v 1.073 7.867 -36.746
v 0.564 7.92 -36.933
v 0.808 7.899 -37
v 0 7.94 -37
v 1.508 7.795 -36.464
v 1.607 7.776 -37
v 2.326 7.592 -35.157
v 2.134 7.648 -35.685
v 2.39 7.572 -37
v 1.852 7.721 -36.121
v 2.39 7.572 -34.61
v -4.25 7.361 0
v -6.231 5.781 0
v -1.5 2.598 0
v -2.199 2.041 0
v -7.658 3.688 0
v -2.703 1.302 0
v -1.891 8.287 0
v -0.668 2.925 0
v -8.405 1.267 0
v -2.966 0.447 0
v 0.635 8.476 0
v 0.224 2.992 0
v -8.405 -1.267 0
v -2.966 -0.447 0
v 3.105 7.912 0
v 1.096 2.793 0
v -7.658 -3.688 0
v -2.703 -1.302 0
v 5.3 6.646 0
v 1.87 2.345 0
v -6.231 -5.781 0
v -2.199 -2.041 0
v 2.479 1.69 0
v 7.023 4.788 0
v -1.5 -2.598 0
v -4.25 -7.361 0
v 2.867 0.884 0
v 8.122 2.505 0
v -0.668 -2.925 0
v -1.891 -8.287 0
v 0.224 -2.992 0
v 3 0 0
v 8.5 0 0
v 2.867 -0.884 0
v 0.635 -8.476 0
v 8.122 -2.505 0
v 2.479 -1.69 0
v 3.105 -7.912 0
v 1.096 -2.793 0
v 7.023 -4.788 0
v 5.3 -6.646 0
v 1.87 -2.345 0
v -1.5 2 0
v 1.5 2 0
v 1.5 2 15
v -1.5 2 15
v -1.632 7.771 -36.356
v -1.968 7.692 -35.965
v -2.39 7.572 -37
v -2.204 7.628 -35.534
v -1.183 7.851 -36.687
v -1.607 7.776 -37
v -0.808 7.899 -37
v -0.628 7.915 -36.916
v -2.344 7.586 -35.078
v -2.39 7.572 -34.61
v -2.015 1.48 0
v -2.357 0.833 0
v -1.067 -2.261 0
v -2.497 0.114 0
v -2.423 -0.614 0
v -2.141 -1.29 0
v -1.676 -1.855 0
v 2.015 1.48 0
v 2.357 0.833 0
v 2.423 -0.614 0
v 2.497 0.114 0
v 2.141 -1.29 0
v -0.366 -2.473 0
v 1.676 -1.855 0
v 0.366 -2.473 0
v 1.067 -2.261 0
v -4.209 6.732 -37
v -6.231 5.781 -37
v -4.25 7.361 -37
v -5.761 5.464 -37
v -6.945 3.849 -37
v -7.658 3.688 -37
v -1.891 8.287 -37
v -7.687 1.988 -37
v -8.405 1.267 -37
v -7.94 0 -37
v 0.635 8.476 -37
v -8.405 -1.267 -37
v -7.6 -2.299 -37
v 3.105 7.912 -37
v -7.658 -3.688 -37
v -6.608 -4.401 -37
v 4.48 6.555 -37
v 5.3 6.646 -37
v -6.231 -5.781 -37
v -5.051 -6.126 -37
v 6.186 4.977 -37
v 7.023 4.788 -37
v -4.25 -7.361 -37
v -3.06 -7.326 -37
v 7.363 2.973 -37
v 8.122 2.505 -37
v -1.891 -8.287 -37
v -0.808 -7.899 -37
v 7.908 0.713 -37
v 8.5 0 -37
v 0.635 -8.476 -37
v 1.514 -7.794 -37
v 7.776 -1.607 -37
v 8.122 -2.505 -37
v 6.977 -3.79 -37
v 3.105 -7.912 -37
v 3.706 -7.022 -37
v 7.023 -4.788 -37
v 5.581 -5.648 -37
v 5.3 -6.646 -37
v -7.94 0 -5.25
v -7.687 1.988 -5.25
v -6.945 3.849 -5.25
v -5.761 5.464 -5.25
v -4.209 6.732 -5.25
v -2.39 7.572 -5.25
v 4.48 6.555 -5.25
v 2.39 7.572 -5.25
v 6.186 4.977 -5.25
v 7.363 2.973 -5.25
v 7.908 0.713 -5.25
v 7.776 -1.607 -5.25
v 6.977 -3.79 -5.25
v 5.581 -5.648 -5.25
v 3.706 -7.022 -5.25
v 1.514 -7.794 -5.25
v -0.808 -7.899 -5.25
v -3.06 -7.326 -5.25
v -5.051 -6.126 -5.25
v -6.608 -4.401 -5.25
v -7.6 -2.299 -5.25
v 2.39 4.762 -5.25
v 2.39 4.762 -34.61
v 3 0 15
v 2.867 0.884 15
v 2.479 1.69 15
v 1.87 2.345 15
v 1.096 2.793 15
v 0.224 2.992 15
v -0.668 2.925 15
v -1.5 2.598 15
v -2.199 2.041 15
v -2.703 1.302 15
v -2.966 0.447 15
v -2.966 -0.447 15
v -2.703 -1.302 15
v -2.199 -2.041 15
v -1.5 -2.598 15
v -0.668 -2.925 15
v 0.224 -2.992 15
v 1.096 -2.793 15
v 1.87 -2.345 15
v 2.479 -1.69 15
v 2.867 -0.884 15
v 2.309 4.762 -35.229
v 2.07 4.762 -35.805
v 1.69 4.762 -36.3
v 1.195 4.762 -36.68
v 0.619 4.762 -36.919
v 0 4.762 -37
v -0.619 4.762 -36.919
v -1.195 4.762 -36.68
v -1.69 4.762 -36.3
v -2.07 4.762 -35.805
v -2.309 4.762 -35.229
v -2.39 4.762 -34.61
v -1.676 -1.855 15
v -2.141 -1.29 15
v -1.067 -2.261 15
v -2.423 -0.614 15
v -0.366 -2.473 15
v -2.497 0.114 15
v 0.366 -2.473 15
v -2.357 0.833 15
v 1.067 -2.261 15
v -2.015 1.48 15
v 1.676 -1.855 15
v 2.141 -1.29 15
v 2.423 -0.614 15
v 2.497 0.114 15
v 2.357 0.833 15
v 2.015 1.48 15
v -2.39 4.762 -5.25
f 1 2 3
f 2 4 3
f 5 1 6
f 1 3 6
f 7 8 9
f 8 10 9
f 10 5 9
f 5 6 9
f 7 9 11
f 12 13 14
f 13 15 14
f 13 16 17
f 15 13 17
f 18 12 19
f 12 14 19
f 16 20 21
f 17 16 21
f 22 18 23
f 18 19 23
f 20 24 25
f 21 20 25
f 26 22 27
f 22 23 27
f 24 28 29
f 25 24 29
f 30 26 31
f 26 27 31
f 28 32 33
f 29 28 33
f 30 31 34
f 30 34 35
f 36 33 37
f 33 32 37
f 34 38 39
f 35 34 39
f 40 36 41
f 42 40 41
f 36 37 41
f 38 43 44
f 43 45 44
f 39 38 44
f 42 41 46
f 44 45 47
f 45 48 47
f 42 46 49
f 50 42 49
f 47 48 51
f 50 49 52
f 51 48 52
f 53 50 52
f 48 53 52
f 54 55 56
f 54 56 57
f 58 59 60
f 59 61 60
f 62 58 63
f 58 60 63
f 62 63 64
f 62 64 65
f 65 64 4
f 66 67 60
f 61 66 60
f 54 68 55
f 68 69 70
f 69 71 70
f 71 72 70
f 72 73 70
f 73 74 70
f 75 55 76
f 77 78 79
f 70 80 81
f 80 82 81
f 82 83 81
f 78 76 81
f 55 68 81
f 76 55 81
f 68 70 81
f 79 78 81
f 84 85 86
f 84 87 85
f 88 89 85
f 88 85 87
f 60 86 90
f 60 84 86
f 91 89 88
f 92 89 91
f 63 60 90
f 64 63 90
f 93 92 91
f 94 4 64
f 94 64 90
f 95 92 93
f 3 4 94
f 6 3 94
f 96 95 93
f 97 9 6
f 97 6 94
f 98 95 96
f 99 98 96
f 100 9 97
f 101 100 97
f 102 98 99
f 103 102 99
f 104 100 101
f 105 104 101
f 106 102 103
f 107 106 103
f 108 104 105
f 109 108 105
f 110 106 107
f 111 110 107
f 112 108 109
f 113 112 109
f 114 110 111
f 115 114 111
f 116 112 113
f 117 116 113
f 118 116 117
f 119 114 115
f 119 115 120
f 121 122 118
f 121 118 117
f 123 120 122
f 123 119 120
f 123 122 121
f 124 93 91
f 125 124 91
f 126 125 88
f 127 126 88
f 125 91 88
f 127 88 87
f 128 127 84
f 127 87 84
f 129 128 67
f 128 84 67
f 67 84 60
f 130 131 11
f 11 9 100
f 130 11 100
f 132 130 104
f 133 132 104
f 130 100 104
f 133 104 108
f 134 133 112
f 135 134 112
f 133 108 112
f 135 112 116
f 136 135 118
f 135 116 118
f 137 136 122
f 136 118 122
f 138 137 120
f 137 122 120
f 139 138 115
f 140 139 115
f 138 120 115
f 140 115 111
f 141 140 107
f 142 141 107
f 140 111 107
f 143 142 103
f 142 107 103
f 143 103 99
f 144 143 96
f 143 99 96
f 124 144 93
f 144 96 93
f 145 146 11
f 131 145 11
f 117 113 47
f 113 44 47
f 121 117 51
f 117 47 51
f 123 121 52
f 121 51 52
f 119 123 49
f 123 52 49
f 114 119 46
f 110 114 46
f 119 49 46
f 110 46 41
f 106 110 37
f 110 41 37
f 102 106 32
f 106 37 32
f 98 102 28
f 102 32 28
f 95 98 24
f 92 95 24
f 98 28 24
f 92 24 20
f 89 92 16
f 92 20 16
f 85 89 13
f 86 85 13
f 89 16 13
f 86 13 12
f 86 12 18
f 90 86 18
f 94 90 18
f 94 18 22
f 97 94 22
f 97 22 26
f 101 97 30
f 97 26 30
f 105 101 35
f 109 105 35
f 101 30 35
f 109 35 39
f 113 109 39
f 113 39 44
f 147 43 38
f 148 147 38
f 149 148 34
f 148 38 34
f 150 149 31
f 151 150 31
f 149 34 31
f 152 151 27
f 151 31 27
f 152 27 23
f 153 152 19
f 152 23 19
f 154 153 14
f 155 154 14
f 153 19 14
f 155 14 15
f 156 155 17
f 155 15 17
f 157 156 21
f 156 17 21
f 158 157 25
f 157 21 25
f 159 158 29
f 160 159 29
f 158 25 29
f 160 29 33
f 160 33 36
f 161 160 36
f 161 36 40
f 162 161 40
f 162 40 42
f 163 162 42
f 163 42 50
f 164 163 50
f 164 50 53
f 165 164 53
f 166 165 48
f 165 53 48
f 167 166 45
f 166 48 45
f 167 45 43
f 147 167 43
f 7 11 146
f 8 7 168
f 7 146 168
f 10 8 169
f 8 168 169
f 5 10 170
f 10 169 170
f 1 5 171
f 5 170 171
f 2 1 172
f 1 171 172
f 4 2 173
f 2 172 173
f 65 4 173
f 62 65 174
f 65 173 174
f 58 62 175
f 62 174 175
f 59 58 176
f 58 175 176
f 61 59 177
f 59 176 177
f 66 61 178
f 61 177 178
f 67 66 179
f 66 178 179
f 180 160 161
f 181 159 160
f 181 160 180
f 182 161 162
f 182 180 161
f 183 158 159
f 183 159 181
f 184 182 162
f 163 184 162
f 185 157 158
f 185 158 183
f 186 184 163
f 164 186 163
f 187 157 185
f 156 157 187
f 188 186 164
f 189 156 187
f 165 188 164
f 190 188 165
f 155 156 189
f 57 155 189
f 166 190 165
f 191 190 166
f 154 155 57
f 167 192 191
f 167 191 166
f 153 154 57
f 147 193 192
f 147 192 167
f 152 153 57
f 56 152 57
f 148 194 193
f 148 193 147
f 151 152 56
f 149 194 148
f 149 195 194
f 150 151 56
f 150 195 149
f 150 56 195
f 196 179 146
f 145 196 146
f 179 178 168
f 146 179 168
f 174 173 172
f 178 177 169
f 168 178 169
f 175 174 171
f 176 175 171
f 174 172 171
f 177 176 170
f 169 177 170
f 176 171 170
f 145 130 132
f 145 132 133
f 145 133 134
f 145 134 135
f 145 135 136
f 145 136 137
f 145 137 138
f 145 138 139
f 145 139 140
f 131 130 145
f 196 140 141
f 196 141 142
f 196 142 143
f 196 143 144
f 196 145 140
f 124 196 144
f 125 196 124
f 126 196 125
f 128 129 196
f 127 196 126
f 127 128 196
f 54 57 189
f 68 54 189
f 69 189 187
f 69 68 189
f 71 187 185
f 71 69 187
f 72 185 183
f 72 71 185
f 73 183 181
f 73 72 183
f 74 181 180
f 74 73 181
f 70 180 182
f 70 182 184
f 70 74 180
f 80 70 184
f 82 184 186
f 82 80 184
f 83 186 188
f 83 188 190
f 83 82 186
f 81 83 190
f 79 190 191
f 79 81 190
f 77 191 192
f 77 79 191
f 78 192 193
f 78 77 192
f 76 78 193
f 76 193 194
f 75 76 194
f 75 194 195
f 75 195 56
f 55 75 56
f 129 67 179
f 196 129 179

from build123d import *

# Parameters (mm, degrees)
SKETCH1_R               = 3
BOSS_EXTRUDE1_DEPTH     = 15
SKETCH2_R               = 8.5
BOSS_EXTRUDE2_DEPTH     = 5.25
SKETCH3_R               = 8.5
BOSS_EXTRUDE4_DEPTH     = 31.75
CUT_EXTRUDE4_DEPTH      = 31.75
CUT_EXTRUDE5_REACH      = 42.213
CUT_EXTRUDE5_END_RADIUS = 7.94


with BuildPart() as part:
    # Sketch1 → Boss-Extrude1 (new body)
    with BuildSketch(Plane.XY):
        Circle(SKETCH1_R)
        with BuildLine():
            Line((1.5, 2), (-1.5, 2))
            ThreePointArc((-1.5, 2), (0, -2.5), (1.5, 2))
        make_face(mode=Mode.SUBTRACT)
    extrude(amount=BOSS_EXTRUDE1_DEPTH)

    # Sketch2 → Boss-Extrude2 (add)
    with BuildSketch(Plane(origin=(0, 0, 0), x_dir=(-1, 0, 0), z_dir=(0, 0, -1))):
        with Locations(Location((0, 0, 0), (0, 0, 180))):
            Circle(SKETCH2_R)
    extrude(amount=BOSS_EXTRUDE2_DEPTH)

    # Sketch3 → Boss-Extrude4 (add)
    with BuildSketch(Plane(origin=(0, 0, -5.25), x_dir=(-1, 0, 0), z_dir=(0, 0, -1))):
        with Locations(Location((0, 0, 0), (0, 0, 180))):
            Circle(SKETCH3_R)
    extrude(amount=BOSS_EXTRUDE4_DEPTH)

    # Sketch13 → Cut-Extrude4 (cut)
    with BuildSketch(Plane(origin=(0, 0, -37), x_dir=(-1, 0, 0), z_dir=(0, 0, -1))):
        with BuildLine():
            Line((-2.39, 4.761756731), (-2.39, 7.571756731))
            ThreePointArc((-2.39, 7.571756731), (-4.693985513, -6.403912866), (7.94, 0))
            ThreePointArc((7.94, 0), (6.403912866, 4.693985513), (2.39, 7.571756731))
            Line((2.39, 7.571756731), (2.39, 4.761756731))
            Line((2.39, 4.761756731), (-2.39, 4.761756731))
        make_face()
    extrude(amount=-CUT_EXTRUDE4_DEPTH, mode=Mode.SUBTRACT)

    # Cut-Extrude5: up to this cylinder (the profile starts inside it)
    cut_extrude5_end = Plane(origin=(0, 0, -36.466151), z_dir=(0, 0, -1)) * Cylinder(CUT_EXTRUDE5_END_RADIUS, 101.306, mode=Mode.PRIVATE)
    # Sketch14 → Cut-Extrude5 (cut, up to the surface)
    with BuildSketch(Plane.XZ.offset(-4.761756731), mode=Mode.PRIVATE) as cut_extrude5_sk1:
        with BuildLine():
            Line((2.39, -37), (2.39, -34.61))
            ThreePointArc((2.39, -34.61), (1.689985208, -36.299985206), (3e-09, -37))
            Line((3e-09, -37), (2.39, -37))
        make_face()
    cut_extrude5_tool1 = extrude(cut_extrude5_sk1.sketch, amount=-CUT_EXTRUDE5_REACH, mode=Mode.PRIVATE) & cut_extrude5_end
    add(cut_extrude5_tool1.solids().sort_by_distance((1.856151, 4.761757, -36.466151))[0], mode=Mode.SUBTRACT)
    # Sketch14 → Cut-Extrude5 (cut, up to the surface)
    with BuildSketch(Plane.XZ.offset(-4.761756731), mode=Mode.PRIVATE) as cut_extrude5_sk2:
        with BuildLine():
            ThreePointArc((3e-09, -37), (-1.689985206, -36.299985208), (-2.39, -34.61))
            Line((-2.39, -34.61), (-2.39, -37))
            Line((-2.39, -37), (3e-09, -37))
        make_face()
    cut_extrude5_tool2 = extrude(cut_extrude5_sk2.sketch, amount=-CUT_EXTRUDE5_REACH, mode=Mode.PRIVATE) & cut_extrude5_end
    add(cut_extrude5_tool2.solids().sort_by_distance((-1.856151, 4.761757, -36.466151))[0], mode=Mode.SUBTRACT)


solid = part.part
